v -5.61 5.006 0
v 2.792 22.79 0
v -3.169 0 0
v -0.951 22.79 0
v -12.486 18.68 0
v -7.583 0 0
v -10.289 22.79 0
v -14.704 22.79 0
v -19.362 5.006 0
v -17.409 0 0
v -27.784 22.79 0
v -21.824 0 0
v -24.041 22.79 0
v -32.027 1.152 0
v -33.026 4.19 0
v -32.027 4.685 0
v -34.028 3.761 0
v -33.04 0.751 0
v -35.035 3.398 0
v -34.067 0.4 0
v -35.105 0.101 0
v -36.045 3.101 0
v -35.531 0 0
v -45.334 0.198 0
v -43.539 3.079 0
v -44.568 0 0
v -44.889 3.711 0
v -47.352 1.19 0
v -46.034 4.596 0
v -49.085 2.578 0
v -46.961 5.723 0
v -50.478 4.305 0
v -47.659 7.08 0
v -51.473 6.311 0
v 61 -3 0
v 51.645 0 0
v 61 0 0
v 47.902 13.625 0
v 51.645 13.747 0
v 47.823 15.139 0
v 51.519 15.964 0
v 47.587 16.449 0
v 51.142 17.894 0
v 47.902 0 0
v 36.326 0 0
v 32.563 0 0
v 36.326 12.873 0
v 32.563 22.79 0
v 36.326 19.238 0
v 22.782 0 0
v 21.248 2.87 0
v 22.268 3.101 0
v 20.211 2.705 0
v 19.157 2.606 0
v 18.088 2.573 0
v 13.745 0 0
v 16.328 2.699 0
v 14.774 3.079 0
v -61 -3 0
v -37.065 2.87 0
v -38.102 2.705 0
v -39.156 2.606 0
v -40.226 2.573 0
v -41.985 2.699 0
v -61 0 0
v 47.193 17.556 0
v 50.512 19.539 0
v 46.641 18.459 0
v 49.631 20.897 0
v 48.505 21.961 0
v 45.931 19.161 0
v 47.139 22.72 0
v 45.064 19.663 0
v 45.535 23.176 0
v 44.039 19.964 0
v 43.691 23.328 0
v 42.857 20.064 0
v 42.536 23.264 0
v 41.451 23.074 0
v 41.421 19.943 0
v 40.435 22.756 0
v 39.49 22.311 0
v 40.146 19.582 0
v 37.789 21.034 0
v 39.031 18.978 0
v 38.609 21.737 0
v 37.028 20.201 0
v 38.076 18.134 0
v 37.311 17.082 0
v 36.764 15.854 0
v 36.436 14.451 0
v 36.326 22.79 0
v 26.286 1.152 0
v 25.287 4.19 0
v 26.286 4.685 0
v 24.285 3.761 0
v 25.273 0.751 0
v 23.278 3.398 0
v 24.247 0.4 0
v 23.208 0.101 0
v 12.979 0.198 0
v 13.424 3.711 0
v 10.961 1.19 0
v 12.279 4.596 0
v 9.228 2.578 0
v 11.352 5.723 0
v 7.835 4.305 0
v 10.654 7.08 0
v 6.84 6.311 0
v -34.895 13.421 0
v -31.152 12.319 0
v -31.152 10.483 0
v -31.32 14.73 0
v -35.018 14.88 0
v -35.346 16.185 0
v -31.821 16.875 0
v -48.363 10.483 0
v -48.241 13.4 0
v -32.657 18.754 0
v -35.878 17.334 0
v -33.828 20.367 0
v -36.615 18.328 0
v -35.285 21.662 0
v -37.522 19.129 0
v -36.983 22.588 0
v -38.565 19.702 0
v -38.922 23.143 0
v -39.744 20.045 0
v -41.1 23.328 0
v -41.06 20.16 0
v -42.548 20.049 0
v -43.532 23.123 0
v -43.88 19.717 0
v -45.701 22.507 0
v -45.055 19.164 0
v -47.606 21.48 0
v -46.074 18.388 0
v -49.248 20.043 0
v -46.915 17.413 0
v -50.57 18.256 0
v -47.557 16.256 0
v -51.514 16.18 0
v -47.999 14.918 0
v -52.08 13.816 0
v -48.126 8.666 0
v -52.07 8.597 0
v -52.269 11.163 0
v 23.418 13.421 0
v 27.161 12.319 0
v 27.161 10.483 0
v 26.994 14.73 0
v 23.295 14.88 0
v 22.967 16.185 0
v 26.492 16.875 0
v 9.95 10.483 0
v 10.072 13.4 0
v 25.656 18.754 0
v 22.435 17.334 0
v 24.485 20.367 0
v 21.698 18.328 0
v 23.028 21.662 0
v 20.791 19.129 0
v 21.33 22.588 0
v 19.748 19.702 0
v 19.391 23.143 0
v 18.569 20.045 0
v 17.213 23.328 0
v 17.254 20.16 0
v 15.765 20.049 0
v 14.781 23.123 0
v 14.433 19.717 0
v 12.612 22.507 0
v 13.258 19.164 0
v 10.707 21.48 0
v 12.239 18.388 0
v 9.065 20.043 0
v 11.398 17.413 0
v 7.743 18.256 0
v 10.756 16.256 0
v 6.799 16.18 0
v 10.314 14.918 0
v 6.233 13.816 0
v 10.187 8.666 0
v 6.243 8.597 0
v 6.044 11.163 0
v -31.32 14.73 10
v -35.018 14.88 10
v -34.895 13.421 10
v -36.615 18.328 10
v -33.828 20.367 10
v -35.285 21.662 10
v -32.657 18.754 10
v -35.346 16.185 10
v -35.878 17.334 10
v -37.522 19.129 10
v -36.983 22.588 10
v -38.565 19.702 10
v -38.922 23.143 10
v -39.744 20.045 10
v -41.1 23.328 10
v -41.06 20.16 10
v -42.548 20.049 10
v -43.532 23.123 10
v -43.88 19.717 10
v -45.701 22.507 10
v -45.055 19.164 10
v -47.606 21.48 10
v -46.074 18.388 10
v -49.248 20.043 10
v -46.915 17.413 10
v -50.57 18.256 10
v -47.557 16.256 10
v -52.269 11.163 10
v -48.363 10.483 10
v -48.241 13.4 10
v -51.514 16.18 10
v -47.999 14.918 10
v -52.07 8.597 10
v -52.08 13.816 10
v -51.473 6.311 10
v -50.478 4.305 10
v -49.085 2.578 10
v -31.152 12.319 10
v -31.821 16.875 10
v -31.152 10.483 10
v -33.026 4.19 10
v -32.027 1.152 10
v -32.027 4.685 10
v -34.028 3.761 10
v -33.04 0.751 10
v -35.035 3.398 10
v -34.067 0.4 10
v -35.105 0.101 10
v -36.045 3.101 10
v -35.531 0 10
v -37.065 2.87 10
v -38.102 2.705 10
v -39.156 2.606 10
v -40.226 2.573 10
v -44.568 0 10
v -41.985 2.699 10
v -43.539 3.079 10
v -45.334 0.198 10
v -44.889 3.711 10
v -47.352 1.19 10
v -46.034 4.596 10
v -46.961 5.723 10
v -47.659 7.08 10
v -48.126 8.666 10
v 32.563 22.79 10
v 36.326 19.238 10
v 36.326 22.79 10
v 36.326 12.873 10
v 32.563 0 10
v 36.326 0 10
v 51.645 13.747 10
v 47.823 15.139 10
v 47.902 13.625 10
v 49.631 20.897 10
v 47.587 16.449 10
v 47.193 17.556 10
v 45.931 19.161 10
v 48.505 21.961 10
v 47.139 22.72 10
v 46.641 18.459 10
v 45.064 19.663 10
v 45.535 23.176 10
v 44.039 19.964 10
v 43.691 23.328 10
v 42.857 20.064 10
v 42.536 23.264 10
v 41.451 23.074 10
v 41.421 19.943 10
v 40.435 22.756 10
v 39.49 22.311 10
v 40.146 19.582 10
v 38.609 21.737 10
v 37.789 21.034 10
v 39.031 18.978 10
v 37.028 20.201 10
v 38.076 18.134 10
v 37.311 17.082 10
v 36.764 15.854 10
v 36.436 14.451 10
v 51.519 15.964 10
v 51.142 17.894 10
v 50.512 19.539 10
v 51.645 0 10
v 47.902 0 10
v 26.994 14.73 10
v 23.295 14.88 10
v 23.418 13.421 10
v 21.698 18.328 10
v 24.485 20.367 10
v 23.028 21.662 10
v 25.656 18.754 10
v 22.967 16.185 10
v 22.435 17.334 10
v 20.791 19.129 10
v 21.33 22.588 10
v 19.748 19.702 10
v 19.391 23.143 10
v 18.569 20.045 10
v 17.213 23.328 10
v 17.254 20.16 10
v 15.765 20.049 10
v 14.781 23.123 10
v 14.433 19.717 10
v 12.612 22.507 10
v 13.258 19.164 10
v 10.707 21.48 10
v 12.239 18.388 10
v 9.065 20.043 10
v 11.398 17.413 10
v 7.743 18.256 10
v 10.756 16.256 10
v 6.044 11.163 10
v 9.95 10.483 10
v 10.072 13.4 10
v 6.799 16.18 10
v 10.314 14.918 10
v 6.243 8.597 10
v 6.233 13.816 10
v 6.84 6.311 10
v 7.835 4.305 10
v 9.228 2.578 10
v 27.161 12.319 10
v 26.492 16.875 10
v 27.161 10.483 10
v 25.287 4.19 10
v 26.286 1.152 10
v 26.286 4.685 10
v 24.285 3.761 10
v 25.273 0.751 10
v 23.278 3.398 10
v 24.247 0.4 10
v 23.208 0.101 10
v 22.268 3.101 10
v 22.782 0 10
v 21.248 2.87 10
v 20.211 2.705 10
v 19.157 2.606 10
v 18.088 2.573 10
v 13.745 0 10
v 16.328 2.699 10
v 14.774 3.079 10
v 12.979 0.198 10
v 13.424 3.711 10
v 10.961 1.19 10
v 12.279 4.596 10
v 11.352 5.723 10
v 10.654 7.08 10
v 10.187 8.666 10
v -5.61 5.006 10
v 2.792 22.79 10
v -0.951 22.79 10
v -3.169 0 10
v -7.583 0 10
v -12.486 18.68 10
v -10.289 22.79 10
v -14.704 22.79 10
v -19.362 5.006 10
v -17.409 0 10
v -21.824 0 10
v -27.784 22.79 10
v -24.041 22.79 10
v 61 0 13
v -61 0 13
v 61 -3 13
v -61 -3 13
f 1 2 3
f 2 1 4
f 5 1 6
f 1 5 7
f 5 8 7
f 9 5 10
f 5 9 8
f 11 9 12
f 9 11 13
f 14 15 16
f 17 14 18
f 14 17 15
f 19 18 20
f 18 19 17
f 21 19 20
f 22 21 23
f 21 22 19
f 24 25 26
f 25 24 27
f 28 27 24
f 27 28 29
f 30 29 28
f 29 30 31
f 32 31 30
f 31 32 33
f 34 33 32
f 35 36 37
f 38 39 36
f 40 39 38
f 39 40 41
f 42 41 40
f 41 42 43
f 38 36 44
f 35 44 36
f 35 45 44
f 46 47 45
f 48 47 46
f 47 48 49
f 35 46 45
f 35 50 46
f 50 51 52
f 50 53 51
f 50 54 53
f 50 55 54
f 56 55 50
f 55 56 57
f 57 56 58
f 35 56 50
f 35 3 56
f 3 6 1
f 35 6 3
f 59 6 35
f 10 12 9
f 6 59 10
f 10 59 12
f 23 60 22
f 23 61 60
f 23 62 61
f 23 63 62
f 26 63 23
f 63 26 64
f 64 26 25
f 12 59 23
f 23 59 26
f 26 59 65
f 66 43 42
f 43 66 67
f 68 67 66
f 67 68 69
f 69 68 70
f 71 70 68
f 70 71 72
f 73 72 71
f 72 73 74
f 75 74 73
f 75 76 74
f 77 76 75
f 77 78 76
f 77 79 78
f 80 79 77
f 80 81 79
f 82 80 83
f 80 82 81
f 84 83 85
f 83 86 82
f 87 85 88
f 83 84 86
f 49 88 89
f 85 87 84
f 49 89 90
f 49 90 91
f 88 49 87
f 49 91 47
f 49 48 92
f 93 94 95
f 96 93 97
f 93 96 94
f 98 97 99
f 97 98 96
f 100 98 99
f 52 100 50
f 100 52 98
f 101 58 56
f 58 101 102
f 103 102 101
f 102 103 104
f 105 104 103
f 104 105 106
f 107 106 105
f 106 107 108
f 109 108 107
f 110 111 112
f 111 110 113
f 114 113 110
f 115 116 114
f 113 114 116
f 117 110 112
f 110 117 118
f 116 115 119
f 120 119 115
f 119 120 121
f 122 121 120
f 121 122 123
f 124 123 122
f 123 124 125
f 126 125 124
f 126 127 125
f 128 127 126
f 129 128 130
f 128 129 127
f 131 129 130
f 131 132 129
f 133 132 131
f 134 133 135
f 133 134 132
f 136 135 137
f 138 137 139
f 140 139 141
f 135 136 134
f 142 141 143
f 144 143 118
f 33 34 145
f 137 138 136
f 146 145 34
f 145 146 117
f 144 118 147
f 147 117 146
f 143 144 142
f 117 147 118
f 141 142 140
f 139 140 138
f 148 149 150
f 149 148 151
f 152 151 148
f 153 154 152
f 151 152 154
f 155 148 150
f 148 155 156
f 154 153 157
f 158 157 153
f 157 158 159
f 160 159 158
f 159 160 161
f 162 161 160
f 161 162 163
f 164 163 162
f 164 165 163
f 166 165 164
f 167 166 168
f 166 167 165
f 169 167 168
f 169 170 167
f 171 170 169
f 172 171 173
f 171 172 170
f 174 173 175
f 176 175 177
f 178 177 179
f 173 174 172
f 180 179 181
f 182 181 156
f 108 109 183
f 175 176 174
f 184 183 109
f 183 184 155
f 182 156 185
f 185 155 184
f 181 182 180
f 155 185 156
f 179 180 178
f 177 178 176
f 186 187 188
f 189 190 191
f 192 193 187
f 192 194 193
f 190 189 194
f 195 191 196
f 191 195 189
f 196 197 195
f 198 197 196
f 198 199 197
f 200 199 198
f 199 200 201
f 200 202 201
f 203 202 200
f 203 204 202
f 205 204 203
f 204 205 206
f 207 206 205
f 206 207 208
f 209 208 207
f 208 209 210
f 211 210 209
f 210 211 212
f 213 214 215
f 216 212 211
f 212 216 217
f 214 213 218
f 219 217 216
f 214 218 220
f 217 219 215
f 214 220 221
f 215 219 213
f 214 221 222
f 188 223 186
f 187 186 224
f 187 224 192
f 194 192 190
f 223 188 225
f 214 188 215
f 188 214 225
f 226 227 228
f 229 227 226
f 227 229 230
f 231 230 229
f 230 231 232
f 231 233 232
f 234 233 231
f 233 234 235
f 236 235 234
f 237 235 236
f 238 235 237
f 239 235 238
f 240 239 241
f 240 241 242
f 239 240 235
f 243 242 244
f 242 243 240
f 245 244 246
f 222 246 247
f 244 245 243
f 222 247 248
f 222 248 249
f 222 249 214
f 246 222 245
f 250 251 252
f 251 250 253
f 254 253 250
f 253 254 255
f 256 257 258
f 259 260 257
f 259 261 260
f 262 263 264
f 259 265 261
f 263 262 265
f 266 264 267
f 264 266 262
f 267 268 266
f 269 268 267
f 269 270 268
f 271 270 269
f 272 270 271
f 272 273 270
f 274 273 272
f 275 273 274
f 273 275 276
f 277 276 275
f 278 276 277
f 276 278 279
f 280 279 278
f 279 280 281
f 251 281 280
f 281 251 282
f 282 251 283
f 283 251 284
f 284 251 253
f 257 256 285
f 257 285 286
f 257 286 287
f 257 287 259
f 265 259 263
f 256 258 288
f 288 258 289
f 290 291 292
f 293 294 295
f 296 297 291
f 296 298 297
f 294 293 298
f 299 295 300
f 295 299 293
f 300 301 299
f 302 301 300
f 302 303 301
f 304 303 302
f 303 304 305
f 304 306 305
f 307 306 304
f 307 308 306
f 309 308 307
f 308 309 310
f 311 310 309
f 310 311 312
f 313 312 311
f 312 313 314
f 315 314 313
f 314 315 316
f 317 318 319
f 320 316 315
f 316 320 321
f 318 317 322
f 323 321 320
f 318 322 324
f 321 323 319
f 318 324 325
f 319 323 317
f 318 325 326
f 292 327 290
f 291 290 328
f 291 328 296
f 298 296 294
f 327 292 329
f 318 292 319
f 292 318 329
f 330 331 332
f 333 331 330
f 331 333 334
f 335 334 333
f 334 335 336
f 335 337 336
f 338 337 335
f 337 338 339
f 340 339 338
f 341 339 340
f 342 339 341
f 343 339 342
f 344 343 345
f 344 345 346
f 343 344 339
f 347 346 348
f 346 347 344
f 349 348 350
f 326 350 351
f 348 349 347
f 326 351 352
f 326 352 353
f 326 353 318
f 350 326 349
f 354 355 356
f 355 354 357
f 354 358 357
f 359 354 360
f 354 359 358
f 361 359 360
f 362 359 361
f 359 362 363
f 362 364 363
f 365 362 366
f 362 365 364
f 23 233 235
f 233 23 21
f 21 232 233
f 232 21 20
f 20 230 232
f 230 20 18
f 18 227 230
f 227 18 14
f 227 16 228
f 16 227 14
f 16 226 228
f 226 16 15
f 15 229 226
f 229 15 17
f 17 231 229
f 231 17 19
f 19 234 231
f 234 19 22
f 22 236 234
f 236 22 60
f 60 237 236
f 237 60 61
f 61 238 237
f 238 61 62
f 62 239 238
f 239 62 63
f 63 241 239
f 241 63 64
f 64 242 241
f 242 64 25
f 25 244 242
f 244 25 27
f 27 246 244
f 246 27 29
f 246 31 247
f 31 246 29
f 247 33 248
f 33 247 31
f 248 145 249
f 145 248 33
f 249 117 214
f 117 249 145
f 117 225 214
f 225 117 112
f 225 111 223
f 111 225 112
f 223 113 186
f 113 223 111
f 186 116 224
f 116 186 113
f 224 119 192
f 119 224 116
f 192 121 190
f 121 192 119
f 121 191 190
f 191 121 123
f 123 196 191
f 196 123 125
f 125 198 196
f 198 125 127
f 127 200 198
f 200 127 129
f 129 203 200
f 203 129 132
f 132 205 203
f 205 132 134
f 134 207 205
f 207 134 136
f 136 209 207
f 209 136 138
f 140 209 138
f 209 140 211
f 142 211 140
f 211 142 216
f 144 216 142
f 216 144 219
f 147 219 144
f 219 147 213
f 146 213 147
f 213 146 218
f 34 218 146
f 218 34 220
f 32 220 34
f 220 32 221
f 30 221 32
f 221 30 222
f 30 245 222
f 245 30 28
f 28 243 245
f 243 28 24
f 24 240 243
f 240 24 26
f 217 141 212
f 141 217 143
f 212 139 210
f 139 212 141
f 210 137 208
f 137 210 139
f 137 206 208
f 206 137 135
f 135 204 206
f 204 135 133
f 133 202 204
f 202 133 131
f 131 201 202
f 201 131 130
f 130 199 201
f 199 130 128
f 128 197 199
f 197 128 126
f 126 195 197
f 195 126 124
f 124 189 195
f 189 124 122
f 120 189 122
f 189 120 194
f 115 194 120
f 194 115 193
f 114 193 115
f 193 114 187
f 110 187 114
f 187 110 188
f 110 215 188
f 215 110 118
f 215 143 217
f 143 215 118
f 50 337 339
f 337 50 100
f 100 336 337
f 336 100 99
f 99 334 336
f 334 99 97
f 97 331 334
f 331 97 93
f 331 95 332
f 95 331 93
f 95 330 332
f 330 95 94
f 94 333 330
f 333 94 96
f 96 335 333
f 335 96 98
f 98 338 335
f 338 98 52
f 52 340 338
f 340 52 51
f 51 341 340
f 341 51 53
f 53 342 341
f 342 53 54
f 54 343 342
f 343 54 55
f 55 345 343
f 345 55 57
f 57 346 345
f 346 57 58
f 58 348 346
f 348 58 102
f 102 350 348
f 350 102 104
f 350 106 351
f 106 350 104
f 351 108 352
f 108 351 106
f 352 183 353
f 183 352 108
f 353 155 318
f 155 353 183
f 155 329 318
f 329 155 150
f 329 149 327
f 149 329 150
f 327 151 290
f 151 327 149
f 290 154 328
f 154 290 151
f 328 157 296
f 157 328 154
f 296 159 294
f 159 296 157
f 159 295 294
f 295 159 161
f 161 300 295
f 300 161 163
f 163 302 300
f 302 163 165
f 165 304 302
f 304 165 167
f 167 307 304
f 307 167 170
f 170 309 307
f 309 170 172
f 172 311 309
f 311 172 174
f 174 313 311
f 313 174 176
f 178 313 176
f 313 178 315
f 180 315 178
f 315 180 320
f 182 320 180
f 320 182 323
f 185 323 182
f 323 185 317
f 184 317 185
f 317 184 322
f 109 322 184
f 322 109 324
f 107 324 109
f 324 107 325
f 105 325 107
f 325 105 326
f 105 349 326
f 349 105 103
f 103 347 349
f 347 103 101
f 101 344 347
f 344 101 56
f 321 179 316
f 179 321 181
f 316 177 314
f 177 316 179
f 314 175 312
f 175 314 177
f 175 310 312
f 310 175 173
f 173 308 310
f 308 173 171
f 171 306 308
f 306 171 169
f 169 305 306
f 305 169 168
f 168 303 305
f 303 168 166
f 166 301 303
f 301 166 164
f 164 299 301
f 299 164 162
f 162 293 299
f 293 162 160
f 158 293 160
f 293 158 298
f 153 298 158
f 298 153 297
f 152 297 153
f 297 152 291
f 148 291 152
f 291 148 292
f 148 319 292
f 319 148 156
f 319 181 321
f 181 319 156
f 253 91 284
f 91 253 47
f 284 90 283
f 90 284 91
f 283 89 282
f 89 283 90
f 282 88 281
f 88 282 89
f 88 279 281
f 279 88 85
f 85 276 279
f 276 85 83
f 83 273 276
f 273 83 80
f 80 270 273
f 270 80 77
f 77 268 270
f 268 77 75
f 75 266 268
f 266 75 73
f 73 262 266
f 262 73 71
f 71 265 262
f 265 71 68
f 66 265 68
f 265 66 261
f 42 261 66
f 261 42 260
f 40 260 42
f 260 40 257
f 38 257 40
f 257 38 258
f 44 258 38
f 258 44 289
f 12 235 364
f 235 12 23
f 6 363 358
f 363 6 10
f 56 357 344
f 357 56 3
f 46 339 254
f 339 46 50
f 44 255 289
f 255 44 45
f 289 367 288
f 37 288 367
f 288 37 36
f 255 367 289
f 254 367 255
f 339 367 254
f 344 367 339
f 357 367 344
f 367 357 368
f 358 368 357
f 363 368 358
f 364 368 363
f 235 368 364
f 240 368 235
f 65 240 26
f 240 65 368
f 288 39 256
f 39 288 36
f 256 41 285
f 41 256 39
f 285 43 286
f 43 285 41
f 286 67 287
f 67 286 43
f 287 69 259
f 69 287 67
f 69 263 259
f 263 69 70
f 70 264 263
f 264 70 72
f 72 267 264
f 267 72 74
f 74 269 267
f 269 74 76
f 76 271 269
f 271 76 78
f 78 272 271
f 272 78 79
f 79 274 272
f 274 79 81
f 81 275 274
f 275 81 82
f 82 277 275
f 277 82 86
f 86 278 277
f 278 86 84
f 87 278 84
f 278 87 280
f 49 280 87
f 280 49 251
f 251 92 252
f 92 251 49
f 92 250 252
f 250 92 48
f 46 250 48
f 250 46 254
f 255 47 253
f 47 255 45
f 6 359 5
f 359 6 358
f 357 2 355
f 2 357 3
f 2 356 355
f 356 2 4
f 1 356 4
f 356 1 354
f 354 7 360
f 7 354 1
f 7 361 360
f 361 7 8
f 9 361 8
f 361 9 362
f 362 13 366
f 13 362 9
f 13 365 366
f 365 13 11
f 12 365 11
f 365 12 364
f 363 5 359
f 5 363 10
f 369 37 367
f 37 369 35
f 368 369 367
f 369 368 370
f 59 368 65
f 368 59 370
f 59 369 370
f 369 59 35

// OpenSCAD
// file: Minecraft_Name.scad
module Minecraft_Name(text, font_size=30, extrude_height=10, extra_base=3, adjust_base_width=0, texture_width=1.6, texture_depth=0.4)
{
    nb_char = len(text);
    color("LimeGreen")
    
    union() {
        linear_extrude(height=extrude_height)
          text(text=text, size=font_size, font="Minecrafter", halign="center");
        translate([0, -extra_base/2, (extrude_height+extra_base)/2])
          cube(size=[nb_char*font_size+adjust_base_width, extra_base, extrude_height+extra_base], center=true);
    }
}
// main file
use <Minecraft_Name.scad>;

Minecraft_Name("ewen", font_size=30, extra_base=3, adjust_base_width=2, texture_depth=0);
